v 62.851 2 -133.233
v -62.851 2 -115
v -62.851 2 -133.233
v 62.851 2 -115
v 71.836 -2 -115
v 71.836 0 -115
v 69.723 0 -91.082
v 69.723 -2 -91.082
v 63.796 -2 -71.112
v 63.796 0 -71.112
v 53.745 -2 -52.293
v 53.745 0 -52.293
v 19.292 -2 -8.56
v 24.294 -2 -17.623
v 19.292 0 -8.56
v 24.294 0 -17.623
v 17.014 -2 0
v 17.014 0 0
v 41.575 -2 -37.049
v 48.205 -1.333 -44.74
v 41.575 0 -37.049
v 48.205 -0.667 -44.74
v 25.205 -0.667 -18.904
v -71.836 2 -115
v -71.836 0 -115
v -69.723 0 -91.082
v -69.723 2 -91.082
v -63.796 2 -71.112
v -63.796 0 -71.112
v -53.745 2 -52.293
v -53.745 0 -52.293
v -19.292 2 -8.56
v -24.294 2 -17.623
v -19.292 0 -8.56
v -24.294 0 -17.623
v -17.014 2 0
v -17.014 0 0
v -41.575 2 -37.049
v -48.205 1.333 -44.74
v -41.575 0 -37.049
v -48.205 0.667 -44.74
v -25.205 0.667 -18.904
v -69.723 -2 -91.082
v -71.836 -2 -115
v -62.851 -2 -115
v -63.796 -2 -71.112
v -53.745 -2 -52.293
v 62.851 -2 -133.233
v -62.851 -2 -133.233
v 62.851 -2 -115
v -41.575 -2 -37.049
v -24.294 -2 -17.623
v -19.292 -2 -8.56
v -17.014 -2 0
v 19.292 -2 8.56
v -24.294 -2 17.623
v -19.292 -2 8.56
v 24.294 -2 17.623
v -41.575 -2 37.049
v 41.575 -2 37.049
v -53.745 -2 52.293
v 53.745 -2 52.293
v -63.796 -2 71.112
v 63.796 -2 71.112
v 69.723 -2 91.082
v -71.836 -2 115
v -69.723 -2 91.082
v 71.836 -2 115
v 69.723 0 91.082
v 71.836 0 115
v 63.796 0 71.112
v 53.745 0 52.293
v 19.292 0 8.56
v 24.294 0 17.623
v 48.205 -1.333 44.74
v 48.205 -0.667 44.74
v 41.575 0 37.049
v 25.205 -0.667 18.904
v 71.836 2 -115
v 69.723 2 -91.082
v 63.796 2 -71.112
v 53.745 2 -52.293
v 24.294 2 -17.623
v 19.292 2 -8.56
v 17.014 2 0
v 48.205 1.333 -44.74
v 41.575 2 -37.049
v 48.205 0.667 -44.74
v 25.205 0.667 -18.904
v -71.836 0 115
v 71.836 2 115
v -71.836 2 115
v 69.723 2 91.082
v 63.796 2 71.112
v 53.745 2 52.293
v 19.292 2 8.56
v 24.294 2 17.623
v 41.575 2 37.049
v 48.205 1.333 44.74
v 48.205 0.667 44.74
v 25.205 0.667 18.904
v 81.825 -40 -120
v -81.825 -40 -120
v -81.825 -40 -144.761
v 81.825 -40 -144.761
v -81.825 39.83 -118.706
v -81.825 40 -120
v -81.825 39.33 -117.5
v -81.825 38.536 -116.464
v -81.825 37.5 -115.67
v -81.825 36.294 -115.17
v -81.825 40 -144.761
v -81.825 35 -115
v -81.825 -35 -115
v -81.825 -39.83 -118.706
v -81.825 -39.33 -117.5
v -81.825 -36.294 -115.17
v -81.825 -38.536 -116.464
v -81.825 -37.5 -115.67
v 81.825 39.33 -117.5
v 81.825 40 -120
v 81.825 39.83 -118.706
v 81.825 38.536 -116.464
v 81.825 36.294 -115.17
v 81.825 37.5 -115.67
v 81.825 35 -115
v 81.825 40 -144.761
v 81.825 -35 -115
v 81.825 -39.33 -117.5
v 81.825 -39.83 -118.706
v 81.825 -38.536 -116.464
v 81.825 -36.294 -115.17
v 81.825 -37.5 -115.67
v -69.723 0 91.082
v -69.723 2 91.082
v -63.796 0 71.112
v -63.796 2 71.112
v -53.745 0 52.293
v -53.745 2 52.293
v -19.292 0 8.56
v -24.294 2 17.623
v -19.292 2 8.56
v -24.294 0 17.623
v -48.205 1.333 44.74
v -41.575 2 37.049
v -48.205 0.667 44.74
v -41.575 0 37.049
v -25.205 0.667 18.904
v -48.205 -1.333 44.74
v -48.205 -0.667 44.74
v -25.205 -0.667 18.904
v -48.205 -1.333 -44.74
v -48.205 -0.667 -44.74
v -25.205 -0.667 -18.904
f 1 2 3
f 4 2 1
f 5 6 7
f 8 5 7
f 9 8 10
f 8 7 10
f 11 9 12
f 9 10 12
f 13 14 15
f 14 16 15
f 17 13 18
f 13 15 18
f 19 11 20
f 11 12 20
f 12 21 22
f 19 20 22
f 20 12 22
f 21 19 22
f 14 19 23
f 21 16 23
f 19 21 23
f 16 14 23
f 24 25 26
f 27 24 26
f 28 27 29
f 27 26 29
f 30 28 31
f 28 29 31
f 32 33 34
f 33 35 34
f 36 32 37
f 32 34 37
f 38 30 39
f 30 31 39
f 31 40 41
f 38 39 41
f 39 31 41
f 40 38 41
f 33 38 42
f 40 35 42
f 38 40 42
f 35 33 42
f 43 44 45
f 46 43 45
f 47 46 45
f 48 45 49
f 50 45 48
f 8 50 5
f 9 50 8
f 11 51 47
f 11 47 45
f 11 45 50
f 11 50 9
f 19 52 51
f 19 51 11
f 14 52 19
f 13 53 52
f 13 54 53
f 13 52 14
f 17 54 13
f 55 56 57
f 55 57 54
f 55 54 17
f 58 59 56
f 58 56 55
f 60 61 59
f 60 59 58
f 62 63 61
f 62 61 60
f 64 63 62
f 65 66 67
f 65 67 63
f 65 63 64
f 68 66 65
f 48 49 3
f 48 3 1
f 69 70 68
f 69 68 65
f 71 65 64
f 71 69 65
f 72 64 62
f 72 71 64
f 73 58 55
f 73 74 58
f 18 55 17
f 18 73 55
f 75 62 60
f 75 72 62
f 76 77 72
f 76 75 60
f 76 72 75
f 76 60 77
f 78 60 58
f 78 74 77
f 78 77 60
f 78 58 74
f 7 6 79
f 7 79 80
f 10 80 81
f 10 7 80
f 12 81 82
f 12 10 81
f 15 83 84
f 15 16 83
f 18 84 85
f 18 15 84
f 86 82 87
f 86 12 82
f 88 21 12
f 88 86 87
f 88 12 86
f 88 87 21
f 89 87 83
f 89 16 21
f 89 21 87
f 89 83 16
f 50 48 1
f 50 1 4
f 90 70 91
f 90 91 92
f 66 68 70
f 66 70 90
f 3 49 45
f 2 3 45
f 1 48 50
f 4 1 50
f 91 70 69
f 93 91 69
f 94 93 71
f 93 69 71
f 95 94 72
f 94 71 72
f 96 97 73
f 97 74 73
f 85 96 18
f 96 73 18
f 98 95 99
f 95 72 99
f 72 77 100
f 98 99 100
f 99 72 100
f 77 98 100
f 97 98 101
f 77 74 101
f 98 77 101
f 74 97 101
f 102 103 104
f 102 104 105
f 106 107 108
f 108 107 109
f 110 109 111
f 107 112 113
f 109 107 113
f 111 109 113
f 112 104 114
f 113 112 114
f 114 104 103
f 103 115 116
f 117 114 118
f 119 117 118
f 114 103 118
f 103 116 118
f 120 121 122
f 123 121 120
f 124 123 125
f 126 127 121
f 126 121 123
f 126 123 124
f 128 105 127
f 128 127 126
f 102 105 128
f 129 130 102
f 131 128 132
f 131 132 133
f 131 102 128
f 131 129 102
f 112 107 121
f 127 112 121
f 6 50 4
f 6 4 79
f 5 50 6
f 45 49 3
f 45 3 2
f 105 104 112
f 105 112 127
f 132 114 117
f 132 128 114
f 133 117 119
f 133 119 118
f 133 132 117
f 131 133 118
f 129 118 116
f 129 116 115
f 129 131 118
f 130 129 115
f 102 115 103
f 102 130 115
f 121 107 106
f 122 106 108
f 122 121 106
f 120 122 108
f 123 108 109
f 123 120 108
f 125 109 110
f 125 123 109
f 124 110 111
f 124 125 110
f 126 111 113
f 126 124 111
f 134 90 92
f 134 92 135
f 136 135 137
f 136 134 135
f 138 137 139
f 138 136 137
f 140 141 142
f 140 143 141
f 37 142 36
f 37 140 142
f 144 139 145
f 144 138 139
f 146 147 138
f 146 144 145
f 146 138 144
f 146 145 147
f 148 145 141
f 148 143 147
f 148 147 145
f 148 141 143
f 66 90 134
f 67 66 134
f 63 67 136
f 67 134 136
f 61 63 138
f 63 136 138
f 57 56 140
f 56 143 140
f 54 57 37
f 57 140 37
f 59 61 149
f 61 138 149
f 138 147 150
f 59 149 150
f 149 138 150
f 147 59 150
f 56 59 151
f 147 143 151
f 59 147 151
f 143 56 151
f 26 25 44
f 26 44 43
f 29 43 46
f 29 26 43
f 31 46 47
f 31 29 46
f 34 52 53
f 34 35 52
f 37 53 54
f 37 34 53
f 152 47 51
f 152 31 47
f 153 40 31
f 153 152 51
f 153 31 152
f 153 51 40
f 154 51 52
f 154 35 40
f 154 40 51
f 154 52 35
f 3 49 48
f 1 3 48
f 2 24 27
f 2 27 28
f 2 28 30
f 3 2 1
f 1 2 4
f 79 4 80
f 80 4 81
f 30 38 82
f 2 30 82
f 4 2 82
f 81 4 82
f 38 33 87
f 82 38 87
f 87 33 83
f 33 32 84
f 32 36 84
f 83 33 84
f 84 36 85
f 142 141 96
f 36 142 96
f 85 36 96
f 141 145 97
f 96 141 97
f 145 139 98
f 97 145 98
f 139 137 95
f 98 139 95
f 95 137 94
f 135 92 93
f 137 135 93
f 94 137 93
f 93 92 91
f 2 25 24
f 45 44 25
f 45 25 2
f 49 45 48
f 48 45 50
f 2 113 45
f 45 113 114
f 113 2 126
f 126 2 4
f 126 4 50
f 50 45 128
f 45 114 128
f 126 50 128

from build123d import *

# Parameters (mm, degrees)
F0_W     = 125.702098012
F0_H     = 18.2329118252
F1_DEPTH = 2
F3_W     = 163.6505723
F3_H     = 29.7609269619
F4_DEPTH = 40
F8_R     = 5


# Not quite as in the source:
# - the program builds the solid bodies; features that only make, move or delete a surface that nothing else refers to are left out


with BuildPart() as f1:
    # F0 (on Front) → F1 (new body, symmetric)
    with BuildSketch(Plane.XZ):
        with BuildLine():
            Line((71.8356221218, 115), (-71.8356221218, 115))
            add(Edge.make_bspline(
                [(-71.8356221218, 115), (-72.1203169337, 82.5445248846), (-52.4850086356, 44.7487745495), (-24.5321077683, 21.5541787538), (-17.5291927784, 5.6703685242), (-17.0137044211, 0)],
                knots=[0, 0, 0, 0, 0.4524273346, 0.7614820627, 1, 1, 1, 1], degree=3))
            add(Edge.make_bspline(
                [(-71.8356221218, -115), (-72.1203169337, -82.5445248846), (-52.4850086356, -44.7487745495), (-24.5321077683, -21.5541787538), (-17.5291927784, -5.6703685242), (-17.0137044211, 0)],
                knots=[0, 0, 0, 0, 0.4524273346, 0.7614820627, 1, 1, 1, 1], degree=3))
            Line((-71.8356221218, -115), (-62.851049006, -115))
            Line((-62.851049006, -115), (62.851049006, -115))
            Line((62.851049006, -115), (71.8356221218, -115))
            add(Edge.make_bspline(
                [(71.8356221218, -115), (72.1203169337, -82.5445248846), (52.4850086356, -44.7487745495), (24.5321077683, -21.5541787538), (17.5291927784, -5.6703685242), (17.0137044211, 0)],
                knots=[0, 0, 0, 0, 0.4524273346, 0.7614820627, 1, 1, 1, 1], degree=3))
            add(Edge.make_bspline(
                [(71.8356221218, 115), (72.1203169337, 82.5445248846), (52.4850086356, 44.7487745495), (24.5321077683, 21.5541787538), (17.5291927784, 5.6703685242), (17.0137044211, 0)],
                knots=[0, 0, 0, 0, 0.4524273346, 0.7614820627, 1, 1, 1, 1], degree=3))
        make_face()
        with Locations((0, -124.1164559126)):
            Rectangle(F0_W, F0_H)
    extrude(amount=F1_DEPTH, both=True)


with BuildPart() as f4:
    # F3 (on Front) → F4 (new body, symmetric)
    with BuildSketch(Plane.XZ):
        with Locations((0, -129.8804634809)):
            Rectangle(F3_W, F3_H)
    extrude(amount=F4_DEPTH, both=True)

    # F5: cut F1
    add(f1.part, mode=Mode.SUBTRACT)

    # F8
    f8_edges = [f4.edges().sort_by_distance(p)[0] for p in [
        (0, -40, -115),
        (0, 40, -115),
    ]]
    fillet(f8_edges, radius=F8_R)


solid = Compound([f1.part, f4.part])
